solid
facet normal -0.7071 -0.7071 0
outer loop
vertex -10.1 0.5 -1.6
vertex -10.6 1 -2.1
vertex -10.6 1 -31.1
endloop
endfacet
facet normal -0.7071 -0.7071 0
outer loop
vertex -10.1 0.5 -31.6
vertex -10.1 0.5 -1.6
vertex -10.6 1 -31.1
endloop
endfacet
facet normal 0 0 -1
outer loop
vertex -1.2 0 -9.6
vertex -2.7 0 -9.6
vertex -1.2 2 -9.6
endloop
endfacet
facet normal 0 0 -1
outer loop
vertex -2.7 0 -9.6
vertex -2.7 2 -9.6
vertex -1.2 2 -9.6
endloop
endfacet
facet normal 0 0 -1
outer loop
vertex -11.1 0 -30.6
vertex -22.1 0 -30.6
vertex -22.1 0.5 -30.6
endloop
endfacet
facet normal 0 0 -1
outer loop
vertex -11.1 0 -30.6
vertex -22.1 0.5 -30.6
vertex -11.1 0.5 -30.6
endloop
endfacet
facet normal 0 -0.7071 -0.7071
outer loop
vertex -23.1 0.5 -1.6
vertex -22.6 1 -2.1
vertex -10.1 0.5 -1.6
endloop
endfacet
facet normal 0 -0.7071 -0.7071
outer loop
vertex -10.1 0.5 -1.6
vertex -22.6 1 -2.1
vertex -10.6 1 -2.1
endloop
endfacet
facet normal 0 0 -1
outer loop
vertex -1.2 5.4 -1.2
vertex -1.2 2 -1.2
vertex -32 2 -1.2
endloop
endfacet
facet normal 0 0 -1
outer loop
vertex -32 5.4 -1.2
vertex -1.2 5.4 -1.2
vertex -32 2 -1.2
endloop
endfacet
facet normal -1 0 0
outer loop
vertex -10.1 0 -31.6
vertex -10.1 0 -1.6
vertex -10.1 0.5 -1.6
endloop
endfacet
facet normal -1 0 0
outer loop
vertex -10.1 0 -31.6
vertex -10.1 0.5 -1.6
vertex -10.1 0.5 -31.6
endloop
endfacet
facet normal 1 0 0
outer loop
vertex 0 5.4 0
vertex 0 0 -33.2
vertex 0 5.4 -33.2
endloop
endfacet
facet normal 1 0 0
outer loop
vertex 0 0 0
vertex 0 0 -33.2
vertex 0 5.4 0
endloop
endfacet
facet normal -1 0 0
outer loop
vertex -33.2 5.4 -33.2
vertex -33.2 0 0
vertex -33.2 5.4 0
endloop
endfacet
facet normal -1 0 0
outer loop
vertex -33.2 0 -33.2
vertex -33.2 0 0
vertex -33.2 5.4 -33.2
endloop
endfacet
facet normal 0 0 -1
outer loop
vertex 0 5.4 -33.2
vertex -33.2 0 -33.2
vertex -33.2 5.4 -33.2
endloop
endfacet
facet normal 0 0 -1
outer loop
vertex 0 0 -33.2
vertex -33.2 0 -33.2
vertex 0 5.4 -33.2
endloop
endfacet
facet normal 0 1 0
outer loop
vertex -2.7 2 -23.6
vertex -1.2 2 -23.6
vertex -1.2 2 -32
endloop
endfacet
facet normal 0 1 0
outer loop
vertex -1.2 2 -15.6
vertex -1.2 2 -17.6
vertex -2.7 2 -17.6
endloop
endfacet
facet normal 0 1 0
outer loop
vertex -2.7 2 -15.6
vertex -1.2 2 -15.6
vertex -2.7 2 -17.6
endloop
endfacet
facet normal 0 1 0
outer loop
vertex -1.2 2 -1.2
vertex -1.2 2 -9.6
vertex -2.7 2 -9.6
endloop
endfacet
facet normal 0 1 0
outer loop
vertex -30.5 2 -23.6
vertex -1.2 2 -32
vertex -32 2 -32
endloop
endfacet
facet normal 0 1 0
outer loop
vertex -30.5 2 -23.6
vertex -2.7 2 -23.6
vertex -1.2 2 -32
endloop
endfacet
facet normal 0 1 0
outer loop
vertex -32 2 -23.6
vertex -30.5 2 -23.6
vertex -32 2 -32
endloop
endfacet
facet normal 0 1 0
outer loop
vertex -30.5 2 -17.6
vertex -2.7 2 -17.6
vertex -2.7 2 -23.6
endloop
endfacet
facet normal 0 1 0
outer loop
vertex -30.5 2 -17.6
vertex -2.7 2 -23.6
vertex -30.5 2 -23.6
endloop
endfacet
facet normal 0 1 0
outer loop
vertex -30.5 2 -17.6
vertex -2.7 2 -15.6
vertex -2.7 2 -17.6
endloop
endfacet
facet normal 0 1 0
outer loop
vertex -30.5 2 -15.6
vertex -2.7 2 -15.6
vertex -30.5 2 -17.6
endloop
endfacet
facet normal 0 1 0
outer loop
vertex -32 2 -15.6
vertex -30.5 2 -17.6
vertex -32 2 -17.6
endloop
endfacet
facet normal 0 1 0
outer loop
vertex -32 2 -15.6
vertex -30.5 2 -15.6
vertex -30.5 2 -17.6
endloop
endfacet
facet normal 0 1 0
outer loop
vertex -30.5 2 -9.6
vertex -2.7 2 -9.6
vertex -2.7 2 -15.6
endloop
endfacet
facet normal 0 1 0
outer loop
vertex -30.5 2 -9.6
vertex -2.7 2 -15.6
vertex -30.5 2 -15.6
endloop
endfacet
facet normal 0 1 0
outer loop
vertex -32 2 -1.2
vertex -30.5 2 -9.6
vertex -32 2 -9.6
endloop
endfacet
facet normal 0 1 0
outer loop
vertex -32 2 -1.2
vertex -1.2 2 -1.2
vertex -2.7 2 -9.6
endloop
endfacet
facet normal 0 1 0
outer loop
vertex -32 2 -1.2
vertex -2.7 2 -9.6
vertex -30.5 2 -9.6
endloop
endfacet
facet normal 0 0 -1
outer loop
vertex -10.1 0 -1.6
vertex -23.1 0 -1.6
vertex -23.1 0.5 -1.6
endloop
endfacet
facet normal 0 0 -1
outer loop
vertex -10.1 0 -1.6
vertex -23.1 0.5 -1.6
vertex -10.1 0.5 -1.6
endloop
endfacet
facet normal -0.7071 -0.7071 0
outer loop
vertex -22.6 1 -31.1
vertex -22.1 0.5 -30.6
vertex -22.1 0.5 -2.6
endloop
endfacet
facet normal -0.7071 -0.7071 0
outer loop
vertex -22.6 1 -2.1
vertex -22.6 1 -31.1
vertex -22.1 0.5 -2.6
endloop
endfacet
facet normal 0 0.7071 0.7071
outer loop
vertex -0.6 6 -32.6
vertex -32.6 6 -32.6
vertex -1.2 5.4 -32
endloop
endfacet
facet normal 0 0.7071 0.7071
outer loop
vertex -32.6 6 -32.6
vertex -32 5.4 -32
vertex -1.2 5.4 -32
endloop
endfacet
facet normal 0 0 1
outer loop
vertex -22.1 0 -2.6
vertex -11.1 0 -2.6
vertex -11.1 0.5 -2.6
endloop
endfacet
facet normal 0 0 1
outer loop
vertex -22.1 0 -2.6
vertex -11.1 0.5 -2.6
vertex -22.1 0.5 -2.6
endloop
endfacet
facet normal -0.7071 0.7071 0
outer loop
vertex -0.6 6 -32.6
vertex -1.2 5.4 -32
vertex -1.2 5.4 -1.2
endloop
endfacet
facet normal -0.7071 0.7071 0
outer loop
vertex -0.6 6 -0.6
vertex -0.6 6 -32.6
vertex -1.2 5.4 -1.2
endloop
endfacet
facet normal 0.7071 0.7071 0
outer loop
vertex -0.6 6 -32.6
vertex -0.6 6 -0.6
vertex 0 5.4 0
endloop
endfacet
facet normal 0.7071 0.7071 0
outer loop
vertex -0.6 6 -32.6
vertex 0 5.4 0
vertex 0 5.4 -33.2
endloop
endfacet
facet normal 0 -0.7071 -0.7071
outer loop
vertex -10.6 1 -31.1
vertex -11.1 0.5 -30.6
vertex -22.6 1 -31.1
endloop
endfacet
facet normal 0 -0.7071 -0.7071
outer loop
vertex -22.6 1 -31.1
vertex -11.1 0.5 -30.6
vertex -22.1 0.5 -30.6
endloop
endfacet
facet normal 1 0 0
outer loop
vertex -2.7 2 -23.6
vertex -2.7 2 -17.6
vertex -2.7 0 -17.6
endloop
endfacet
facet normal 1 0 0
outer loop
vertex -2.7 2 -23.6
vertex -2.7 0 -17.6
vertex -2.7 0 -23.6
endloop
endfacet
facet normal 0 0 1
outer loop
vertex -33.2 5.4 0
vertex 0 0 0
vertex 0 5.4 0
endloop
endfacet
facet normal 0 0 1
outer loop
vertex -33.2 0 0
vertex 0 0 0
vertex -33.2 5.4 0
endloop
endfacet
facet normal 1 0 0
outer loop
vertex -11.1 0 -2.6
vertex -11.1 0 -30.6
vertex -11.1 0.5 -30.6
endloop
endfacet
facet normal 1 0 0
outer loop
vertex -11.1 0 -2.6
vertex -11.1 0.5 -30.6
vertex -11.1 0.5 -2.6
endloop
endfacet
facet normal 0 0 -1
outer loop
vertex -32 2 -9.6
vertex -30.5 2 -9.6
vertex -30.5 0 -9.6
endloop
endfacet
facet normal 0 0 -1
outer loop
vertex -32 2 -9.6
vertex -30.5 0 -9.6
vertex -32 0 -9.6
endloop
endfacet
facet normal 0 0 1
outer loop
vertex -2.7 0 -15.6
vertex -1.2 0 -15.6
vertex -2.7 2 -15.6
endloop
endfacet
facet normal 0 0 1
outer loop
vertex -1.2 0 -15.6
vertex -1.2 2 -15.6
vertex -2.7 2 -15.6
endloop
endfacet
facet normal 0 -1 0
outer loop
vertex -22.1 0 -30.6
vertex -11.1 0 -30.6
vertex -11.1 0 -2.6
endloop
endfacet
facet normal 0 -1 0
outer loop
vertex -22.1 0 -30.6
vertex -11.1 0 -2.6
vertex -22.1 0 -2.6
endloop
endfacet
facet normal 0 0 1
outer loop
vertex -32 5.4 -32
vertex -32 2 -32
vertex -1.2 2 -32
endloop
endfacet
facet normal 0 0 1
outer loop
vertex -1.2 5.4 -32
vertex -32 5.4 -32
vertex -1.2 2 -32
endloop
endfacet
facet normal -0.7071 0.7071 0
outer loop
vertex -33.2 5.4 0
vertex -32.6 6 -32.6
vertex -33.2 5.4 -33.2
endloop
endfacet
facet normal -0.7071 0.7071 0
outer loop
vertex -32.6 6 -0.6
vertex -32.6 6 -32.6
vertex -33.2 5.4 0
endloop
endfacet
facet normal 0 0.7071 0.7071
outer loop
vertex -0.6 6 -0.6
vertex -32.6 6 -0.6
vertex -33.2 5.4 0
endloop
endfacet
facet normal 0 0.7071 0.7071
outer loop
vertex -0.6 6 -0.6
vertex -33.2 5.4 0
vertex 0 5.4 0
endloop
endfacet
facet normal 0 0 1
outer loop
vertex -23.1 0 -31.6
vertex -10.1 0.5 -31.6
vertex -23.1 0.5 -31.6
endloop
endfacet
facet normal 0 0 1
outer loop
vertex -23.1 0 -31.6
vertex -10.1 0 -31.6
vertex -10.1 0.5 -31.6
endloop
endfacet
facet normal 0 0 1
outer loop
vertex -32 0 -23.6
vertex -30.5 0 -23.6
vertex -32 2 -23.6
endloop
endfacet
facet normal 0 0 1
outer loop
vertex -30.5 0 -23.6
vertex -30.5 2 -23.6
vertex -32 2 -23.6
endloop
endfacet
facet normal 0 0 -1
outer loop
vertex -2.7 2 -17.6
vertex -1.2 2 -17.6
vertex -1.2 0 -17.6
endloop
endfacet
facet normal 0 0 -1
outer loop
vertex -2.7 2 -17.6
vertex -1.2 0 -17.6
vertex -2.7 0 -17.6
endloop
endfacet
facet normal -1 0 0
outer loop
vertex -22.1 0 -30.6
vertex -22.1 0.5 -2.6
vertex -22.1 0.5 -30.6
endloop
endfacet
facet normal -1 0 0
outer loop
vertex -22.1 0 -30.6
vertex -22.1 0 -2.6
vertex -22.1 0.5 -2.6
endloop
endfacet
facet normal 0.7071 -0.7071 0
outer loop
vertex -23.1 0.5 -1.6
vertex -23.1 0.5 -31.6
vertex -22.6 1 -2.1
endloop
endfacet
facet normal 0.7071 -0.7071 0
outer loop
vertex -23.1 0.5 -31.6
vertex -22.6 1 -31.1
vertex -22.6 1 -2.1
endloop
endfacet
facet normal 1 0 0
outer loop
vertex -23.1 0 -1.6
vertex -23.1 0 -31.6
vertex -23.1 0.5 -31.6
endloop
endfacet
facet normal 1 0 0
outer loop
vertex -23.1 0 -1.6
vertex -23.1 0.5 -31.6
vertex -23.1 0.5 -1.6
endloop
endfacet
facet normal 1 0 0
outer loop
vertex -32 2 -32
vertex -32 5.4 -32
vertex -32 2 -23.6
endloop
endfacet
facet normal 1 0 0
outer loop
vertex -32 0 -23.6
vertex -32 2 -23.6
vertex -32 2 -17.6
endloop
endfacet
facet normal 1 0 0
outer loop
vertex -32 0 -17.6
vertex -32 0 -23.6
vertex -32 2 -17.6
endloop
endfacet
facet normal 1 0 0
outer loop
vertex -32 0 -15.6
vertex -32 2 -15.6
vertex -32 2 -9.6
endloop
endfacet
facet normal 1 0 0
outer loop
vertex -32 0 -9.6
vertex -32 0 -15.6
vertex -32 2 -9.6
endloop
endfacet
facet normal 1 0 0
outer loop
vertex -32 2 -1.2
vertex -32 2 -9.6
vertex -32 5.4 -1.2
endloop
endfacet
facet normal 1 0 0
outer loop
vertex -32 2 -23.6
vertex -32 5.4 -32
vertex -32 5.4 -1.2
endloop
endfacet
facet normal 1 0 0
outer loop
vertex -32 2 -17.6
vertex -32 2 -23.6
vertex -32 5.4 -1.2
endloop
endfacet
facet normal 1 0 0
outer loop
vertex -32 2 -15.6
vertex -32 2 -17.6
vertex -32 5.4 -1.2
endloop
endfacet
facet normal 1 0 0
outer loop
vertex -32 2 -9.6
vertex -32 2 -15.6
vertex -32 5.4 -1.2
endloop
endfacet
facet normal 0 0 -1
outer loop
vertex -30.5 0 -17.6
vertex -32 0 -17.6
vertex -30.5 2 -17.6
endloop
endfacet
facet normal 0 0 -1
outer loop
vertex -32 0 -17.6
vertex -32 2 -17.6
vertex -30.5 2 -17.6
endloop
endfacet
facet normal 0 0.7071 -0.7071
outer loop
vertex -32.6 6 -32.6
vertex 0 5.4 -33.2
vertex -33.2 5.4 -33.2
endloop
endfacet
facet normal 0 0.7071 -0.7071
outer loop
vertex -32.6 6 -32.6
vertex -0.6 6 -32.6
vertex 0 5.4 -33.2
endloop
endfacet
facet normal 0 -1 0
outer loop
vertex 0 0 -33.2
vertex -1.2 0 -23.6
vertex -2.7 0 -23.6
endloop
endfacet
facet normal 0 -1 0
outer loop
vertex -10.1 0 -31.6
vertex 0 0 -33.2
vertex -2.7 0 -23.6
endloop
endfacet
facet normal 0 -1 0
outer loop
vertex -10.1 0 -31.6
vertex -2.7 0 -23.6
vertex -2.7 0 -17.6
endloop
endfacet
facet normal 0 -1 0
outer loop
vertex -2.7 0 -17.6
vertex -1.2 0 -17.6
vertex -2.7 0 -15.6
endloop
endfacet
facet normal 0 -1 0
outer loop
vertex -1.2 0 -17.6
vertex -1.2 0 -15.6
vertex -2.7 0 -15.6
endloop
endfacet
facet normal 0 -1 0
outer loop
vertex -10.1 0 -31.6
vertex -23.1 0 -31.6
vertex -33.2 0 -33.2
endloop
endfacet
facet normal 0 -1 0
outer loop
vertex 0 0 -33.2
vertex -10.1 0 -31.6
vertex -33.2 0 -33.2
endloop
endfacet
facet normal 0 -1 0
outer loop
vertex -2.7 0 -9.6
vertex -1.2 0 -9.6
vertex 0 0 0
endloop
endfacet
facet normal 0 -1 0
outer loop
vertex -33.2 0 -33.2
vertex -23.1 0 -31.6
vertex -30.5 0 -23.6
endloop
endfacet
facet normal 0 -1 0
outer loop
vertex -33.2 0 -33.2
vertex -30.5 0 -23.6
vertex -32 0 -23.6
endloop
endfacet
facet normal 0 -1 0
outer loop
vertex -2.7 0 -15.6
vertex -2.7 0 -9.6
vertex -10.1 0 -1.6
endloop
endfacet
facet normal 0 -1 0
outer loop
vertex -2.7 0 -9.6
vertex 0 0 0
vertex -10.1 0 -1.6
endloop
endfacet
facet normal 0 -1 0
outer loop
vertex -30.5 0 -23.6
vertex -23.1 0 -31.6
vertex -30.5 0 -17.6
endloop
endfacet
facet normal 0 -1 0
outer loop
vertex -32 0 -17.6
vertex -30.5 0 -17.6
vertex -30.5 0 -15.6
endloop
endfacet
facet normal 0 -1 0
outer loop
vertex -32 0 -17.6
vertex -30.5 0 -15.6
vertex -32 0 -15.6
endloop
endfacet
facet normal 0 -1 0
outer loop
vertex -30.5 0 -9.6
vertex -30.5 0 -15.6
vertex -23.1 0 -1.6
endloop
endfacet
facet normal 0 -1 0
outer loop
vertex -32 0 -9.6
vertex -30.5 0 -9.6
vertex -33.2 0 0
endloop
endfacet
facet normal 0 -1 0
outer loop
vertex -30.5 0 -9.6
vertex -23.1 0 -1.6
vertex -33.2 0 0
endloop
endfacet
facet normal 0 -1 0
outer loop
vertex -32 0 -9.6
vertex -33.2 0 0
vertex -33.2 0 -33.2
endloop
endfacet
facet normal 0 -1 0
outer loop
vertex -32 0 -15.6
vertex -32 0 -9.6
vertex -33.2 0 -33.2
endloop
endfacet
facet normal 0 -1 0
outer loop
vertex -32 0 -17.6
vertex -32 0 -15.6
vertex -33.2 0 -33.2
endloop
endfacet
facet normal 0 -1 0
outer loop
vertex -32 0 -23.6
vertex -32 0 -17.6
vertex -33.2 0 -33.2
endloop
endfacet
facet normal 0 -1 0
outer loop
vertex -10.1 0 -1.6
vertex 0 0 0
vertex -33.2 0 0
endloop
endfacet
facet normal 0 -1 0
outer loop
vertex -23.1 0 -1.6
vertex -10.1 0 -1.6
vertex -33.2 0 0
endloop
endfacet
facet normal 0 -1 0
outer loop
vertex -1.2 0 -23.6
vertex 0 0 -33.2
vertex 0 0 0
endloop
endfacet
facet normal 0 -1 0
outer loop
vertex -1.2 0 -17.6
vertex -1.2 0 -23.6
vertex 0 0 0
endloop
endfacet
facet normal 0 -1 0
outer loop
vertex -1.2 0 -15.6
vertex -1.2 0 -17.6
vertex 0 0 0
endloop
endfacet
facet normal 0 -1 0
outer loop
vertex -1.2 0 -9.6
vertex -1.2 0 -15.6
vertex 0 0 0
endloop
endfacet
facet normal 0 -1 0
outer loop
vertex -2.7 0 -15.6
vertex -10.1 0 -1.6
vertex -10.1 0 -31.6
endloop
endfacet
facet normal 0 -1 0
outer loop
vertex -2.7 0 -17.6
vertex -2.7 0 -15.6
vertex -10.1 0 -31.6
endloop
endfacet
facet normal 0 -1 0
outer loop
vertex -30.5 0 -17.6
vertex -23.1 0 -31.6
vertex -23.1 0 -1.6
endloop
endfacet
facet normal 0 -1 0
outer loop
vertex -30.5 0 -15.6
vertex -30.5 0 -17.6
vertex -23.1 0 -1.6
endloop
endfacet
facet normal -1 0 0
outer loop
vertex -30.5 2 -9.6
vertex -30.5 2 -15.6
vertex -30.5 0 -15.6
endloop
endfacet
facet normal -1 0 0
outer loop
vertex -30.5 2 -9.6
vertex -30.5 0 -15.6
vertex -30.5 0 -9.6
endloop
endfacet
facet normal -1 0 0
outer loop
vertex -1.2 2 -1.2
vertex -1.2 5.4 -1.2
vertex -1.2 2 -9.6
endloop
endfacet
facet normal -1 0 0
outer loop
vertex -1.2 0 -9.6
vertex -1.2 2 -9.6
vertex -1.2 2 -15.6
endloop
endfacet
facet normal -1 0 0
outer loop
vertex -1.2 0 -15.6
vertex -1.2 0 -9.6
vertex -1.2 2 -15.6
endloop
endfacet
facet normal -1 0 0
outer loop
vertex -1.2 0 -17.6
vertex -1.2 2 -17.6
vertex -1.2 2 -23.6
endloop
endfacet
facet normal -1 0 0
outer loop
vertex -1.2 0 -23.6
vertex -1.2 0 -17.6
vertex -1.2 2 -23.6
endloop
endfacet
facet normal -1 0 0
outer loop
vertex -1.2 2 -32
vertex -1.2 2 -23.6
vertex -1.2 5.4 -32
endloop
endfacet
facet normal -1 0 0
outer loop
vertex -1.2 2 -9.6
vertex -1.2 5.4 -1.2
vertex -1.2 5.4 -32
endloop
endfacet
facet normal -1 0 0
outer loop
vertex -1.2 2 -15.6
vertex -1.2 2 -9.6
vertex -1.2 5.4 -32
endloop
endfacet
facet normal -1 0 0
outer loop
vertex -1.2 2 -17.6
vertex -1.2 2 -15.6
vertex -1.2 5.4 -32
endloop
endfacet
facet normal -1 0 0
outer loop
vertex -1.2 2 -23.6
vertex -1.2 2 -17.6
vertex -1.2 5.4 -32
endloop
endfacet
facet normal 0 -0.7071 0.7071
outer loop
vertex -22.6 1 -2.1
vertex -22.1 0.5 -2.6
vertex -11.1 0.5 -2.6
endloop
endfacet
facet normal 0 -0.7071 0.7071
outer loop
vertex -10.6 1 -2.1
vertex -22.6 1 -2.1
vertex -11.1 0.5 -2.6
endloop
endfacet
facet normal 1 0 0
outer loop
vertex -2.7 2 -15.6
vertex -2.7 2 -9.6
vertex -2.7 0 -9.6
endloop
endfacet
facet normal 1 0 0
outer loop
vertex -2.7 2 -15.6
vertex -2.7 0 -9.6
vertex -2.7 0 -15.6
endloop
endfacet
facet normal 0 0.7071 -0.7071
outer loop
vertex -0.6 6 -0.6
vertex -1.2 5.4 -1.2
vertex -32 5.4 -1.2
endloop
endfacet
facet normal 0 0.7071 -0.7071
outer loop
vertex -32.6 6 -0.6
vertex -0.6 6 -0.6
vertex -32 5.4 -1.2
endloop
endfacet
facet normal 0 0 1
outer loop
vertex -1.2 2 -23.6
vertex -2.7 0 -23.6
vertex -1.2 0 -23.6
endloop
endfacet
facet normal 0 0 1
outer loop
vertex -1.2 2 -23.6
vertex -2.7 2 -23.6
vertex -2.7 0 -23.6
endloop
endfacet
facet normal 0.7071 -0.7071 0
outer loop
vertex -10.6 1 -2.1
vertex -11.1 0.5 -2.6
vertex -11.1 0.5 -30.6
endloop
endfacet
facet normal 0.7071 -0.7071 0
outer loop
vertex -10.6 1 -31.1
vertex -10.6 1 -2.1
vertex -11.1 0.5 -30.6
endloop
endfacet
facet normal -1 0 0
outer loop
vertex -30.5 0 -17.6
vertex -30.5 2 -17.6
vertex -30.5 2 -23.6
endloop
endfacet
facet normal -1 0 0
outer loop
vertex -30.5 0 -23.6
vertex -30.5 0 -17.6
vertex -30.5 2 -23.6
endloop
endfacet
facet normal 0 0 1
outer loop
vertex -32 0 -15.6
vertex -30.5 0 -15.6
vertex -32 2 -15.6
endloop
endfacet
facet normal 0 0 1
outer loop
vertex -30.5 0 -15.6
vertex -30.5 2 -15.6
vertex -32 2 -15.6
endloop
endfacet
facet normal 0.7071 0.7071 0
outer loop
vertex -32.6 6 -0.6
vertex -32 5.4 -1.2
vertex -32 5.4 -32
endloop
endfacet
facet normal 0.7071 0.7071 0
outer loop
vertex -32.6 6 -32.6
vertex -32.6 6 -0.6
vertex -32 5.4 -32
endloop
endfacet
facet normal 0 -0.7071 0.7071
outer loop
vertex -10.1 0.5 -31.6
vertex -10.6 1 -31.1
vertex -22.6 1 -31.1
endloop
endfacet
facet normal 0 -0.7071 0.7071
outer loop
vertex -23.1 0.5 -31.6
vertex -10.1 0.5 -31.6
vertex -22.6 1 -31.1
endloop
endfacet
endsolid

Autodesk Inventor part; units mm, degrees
ref_plane "YZ Plane" through (0, 0, 0) normal (1, 0, 0) x (0, 1, 0)
ref_plane "XZ Plane" through (0, 0, 0) normal (0, 1, 0) x (-1, 0, 0)
ref_plane "XY Plane" through (0, 0, 0) normal (0, 0, 1) x (1, 0, 0)
sketch "Sketch1" plane through (0, 0, 0) normal (0, 1, 0) x (-1, 0, 0)
  point P0 (0, 0)
sketch "Sketch2" plane through (0, 0, 0) normal (0, 1, 0) x (-1, 0, 0)
  line L0 (0, 0) -> (33.2, 0)
  line L1 (33.2, 0) -> (33.2, -33.2)
  line L2 (33.2, -33.2) -> (0, -33.2)
  line L3 (0, -33.2) -> (0, 0)
  dimension "d0" = 33.2
  dimension "d1" = 33.2
extrude "Extrusion1" add sketch "Sketch2" along normal blind 2
sketch "Sketch3" plane through (0, 2, 0) normal (0, 1, 0) x (1, 0, 0)
  line L0 (0, 33.2) -> (-33.2, 33.2) projected
  line L1 (-33.2, 33.2) -> (-33.2, 0) projected
  line L2 (-33.2, 0) -> (0, 0) projected
  line L3 (0, 0) -> (0, 33.2) projected
  line L4 (-33.2, 0) -> (0, 0) projected
  line L5 (0, 0) -> (-1.2, 0)
  line L6 (-1.2, 0) -> (-1.2, 1.2)
  line L7 (-1.2, 1.2) -> (-32, 1.2)
  line L8 (-32, 1.2) -> (-32, 32)
  line L9 (-32, 32) -> (-1.2, 32)
  line L10 (-1.2, 32) -> (-1.2, 1.2)
  dimension "d4" = 1.2
  dimension "d5" = 1.2
  dimension "d6" = 30.8
  dimension "d7" = 30.8
extrude "Extrusion2" add sketch "Sketch3" along normal blind 4
chamfer "Chamfer1" distance 0.6 angle 45 8 edges at (-1.2, 6, -16.6) (-16.6, 6, -32) (-16.6, 6, -33.2) (0, 6, -16.6) (-16.6, 6, 0) (-16.6, 6, -1.2) (-33.2, 6, -16.6) (-32, 6, -16.6)
sketch "Sketch4" plane through (0, 2, 0) normal (0, 1, 0) x (1, 0, 0)
  line L0 (-1.2, 1.2) -> (-1.2, 32) projected
  line L1 (-1.2, 32) -> (-32, 32) projected
  line L2 (-32, 32) -> (-32, 1.2) projected
  line L3 (-32, 1.2) -> (-1.2, 1.2) projected
  line L4 (-1.2, 1.2) -> (-1.2, 32) projected
  line L5 (-1.2, 16.6) -> (-32, 16.6)
  line L6 (-32, 32) -> (-1.2, 32) projected
  line L7 (-16.6, 32) -> (-16.6, 1.2)
  line L8 (-16.6, 16.6) -> (-16.6, 17.6)
  line L9 (-32, 16.6) -> (-32, 17.6)
  line L10 (-32, 1.2) -> (-32, 32) projected
  line L11 (-32, 17.6) -> (-30.5, 17.6)
  line L12 (-30.5, 17.6) -> (-30.5, 23.6)
  line L13 (-30.5, 23.6) -> (-32, 23.6)
  line L14 (-30.5, 16.6) -> (-30.5, 15.6)
  line L15 (-30.5, 15.6) -> (-32, 15.6)
  line L16 (-30.5, 15.6) -> (-30.5, 9.6)
  line L17 (-30.5, 9.6) -> (-32, 9.6)
  line L18 (-1.2, 16.6) -> (-1.2, 17.6)
  line L19 (-1.2, 17.6) -> (-2.7, 17.6)
  line L20 (-2.7, 17.6) -> (-2.7, 23.6)
  line L21 (-2.7, 23.6) -> (-1.2, 23.6)
  line L22 (-1.2, 16.6) -> (-1.2, 15.6)
  line L23 (-1.2, 15.6) -> (-2.7, 15.6)
  line L24 (-2.7, 9.6) -> (-2.7, 15.6)
  line L25 (-2.7, 9.6) -> (-1.2, 9.6)
  point P0 (0, 0)
  dimension "d13" = 1
  dimension "d14" = 1.5
  dimension "d15" = 6
  dimension "d16" = 1
  dimension "d17" = 6
  dimension "d18" = 1
  dimension "d19" = 1.5
  dimension "d20" = 6
extrude "Extrusion3" cut sketch "Sketch4" against normal blind 4 contours L25 L24 L23 L0 | L2 L15 L16 L17 | L19 L20 L21 L0 | L2 L13 L12 L11
sketch "Sketch5" plane through (0, 0, 0) normal (0, -1, 0) x (1, 0, 0)
  line L0 (-1.2, -17.6) -> (-1.2, -23.6) projected
  line L1 (-1.2, -23.6) -> (-2.7, -23.6) projected
  line L2 (-2.7, -23.6) -> (-2.7, -17.6) projected
  line L3 (-2.7, -17.6) -> (-1.2, -17.6) projected
  line L4 (-32, -23.6) -> (-32, -17.6) projected
  line L5 (-32, -17.6) -> (-30.5, -17.6) projected
  line L6 (-30.5, -17.6) -> (-30.5, -23.6) projected
  line L7 (-30.5, -23.6) -> (-32, -23.6) projected
  line L8 (-1.2, -9.6) -> (-1.2, -15.6) projected
  line L9 (-1.2, -15.6) -> (-2.7, -15.6) projected
  line L10 (-2.7, -15.6) -> (-2.7, -9.6) projected
  line L11 (-2.7, -9.6) -> (-1.2, -9.6) projected
  line L12 (-32, -15.6) -> (-32, -9.6) projected
  line L13 (-32, -9.6) -> (-30.5, -9.6) projected
  line L14 (-30.5, -9.6) -> (-30.5, -15.6) projected
  line L15 (-30.5, -15.6) -> (-32, -15.6) projected
  line L16 (0, -33.2) -> (-33.2, -33.2) projected
  line L17 (0, 0) -> (0, -33.2) projected
  line L18 (-33.2, 0) -> (0, 0) projected
  line L19 (-33.2, -33.2) -> (-33.2, 0) projected
  line L20 (-33.2, 0) -> (0, 0) projected
  line L21 (-16.6, 0) -> (-16.6, -33.2)
  line L22 (0, -33.2) -> (-33.2, -33.2) projected
  line L23 (-16.6, -16.6) -> (-16.6, -1.6)
  line L24 (-1.2, -1.2) -> (-32, -1.2) projected
  line L25 (-16.6, -1.6) -> (-10.1, -1.6)
  line L26 (-10.1, -1.6) -> (-10.1, -31.6)
  line L27 (-10.1, -31.6) -> (-23.1, -31.6)
  line L28 (-23.1, -31.6) -> (-23.1, -1.6)
  line L29 (-23.1, -1.6) -> (-16.6, -1.6)
  line L30 (-10.1, -1.6) -> (-11.1, -1.6)
  line L31 (-11.1, -1.6) -> (-11.1, -2.6)
  line L32 (-11.1, -2.6) -> (-22.1, -2.6)
  line L33 (-22.1, -2.6) -> (-22.1, -30.6)
  line L34 (-22.1, -30.6) -> (-11.1, -30.6)
  line L35 (-11.1, -30.6) -> (-11.1, -2.6)
  dimension "d25" = 6.5
  dimension "d26" = 30
  dimension "d27" = 13
  dimension "d28" = 1
  dimension "d29" = 1
  dimension "d30" = 11
  dimension "d31" = 28
extrude "Extrusion4" cut sketch "Sketch5" against normal blind 1 contours L27 L28 L29 L21 L32 L33 L34 | L21 L34 L35 L31 L25 L26 L27 | L25 L31 L32 L21
chamfer "Chamfer2" distance 0.5 angle 45 8 edges at (-11.1, 1, -16.6) (-16.6, 1, -2.6) (-23.1, 1, -16.6) (-16.6, 1, -1.6) (-22.1, 1, -16.6) (-10.1, 1, -16.6) (-16.6, 1, -30.6) (-16.6, 1, -31.6)
properties part number "led-compartment"
